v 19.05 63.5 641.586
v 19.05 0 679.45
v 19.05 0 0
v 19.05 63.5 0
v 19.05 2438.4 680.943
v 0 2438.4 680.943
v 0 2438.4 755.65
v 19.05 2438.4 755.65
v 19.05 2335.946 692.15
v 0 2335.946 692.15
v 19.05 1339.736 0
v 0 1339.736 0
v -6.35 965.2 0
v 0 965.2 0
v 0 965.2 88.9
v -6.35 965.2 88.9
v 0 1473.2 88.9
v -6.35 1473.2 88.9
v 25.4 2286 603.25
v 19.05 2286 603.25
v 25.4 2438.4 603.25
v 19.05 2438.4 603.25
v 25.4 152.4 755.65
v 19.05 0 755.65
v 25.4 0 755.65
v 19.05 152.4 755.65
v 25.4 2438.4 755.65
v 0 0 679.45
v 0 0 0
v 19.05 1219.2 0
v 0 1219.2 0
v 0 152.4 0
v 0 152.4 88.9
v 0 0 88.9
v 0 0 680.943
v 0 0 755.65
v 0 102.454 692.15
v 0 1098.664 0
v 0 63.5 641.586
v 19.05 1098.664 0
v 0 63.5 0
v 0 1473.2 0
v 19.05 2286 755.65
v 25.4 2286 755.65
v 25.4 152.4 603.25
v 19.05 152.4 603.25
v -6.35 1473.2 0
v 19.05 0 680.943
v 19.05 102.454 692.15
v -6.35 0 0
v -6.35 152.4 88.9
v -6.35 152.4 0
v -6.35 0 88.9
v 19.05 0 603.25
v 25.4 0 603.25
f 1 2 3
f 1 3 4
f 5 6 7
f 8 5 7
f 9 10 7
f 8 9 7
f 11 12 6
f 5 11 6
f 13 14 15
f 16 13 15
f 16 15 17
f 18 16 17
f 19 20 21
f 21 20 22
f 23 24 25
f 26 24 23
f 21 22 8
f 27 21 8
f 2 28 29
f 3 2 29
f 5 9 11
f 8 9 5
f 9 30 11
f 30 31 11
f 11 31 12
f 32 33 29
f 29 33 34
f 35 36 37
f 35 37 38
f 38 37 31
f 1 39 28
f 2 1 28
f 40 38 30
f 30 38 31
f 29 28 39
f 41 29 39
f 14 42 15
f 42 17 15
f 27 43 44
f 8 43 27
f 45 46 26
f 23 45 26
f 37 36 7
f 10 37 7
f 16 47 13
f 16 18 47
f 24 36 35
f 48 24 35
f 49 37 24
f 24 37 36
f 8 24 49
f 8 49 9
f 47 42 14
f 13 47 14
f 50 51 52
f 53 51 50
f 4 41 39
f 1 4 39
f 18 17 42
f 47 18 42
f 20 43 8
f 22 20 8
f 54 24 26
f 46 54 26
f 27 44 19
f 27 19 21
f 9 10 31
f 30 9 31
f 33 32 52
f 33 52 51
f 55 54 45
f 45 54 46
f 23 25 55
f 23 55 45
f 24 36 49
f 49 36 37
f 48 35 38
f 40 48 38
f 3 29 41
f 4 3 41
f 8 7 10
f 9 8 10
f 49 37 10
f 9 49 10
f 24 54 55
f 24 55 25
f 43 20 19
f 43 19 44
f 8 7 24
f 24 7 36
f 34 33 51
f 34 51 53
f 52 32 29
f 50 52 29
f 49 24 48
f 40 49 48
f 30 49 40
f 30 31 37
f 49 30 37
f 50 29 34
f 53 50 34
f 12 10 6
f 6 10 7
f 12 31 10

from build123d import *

# Parameters (mm, degrees)
F1_DEPTH = 19.05
F2_DEPTH = 19.05
F3_W     = 152.4
F3_H     = 152.4
F4_DEPTH = 6.35
F5_W     = 152.4
F5_H     = 88.9
F6_DEPTH = 6.35
F8_DEPTH = 19.05


with BuildPart() as f1:
    # F0 (on Right) → F1 (new body)
    with BuildSketch(Plane.YZ):
        Polygon((2335.946218, 692.15), (1219.2, 0), (1339.736415, 0), (2438.4, 680.942534), (2438.4, 755.65), align=None)
        Polygon((102.453782, 692.15), (0, 755.65), (0, 680.942534), (1098.663585, 0), (1219.2, 0), align=None)
    extrude(amount=F1_DEPTH)


with BuildPart() as f2:
    # F0 (on Right) → F2 (new body)
    with BuildSketch(Plane.YZ):
        Polygon((1219.2, 755.65), (0, 755.65), (102.453782, 692.15), (1216.411535, 692.15), (1221.988465, 692.15), (2335.946218, 692.15), (2438.4, 755.65), align=None)
    extrude(amount=F2_DEPTH)


with BuildPart() as f4:
    # F3 (on face) → F4 (new body)
    with BuildSketch(Plane.YZ.offset(19.05)):
        with Locations((2362.2, 679.45)):
            Rectangle(F3_W, F3_H)
        with Locations((76.2, 679.45)):
            Rectangle(F3_W, F3_H)
    extrude(amount=F4_DEPTH)


with BuildPart() as f6:
    # F5 (on face) → F6 (new body)
    with BuildSketch(Plane(origin=(0, 0, 0), x_dir=(0, -1, 0), z_dir=(-1, 0, 0))):
        Polygon((-1473.2, 0), (-1219.2, 0), (-965.2, 0), (-965.2, 88.9), (-1219.2, 88.9), (-1473.2, 88.9), align=None)
        with Locations((-76.2, 44.45)):
            Rectangle(F5_W, F5_H)
    extrude(amount=F6_DEPTH)


with BuildPart() as f8:
    # F7 (on Right) → F8 (new body)
    with BuildSketch(Plane.YZ):
        Polygon((63.5, 641.585764), (0, 679.45), (0, 0), (63.5, 0), align=None)
    extrude(amount=F8_DEPTH)


solid = Compound([f1.part, f2.part, f4.part, f6.part, f8.part])
